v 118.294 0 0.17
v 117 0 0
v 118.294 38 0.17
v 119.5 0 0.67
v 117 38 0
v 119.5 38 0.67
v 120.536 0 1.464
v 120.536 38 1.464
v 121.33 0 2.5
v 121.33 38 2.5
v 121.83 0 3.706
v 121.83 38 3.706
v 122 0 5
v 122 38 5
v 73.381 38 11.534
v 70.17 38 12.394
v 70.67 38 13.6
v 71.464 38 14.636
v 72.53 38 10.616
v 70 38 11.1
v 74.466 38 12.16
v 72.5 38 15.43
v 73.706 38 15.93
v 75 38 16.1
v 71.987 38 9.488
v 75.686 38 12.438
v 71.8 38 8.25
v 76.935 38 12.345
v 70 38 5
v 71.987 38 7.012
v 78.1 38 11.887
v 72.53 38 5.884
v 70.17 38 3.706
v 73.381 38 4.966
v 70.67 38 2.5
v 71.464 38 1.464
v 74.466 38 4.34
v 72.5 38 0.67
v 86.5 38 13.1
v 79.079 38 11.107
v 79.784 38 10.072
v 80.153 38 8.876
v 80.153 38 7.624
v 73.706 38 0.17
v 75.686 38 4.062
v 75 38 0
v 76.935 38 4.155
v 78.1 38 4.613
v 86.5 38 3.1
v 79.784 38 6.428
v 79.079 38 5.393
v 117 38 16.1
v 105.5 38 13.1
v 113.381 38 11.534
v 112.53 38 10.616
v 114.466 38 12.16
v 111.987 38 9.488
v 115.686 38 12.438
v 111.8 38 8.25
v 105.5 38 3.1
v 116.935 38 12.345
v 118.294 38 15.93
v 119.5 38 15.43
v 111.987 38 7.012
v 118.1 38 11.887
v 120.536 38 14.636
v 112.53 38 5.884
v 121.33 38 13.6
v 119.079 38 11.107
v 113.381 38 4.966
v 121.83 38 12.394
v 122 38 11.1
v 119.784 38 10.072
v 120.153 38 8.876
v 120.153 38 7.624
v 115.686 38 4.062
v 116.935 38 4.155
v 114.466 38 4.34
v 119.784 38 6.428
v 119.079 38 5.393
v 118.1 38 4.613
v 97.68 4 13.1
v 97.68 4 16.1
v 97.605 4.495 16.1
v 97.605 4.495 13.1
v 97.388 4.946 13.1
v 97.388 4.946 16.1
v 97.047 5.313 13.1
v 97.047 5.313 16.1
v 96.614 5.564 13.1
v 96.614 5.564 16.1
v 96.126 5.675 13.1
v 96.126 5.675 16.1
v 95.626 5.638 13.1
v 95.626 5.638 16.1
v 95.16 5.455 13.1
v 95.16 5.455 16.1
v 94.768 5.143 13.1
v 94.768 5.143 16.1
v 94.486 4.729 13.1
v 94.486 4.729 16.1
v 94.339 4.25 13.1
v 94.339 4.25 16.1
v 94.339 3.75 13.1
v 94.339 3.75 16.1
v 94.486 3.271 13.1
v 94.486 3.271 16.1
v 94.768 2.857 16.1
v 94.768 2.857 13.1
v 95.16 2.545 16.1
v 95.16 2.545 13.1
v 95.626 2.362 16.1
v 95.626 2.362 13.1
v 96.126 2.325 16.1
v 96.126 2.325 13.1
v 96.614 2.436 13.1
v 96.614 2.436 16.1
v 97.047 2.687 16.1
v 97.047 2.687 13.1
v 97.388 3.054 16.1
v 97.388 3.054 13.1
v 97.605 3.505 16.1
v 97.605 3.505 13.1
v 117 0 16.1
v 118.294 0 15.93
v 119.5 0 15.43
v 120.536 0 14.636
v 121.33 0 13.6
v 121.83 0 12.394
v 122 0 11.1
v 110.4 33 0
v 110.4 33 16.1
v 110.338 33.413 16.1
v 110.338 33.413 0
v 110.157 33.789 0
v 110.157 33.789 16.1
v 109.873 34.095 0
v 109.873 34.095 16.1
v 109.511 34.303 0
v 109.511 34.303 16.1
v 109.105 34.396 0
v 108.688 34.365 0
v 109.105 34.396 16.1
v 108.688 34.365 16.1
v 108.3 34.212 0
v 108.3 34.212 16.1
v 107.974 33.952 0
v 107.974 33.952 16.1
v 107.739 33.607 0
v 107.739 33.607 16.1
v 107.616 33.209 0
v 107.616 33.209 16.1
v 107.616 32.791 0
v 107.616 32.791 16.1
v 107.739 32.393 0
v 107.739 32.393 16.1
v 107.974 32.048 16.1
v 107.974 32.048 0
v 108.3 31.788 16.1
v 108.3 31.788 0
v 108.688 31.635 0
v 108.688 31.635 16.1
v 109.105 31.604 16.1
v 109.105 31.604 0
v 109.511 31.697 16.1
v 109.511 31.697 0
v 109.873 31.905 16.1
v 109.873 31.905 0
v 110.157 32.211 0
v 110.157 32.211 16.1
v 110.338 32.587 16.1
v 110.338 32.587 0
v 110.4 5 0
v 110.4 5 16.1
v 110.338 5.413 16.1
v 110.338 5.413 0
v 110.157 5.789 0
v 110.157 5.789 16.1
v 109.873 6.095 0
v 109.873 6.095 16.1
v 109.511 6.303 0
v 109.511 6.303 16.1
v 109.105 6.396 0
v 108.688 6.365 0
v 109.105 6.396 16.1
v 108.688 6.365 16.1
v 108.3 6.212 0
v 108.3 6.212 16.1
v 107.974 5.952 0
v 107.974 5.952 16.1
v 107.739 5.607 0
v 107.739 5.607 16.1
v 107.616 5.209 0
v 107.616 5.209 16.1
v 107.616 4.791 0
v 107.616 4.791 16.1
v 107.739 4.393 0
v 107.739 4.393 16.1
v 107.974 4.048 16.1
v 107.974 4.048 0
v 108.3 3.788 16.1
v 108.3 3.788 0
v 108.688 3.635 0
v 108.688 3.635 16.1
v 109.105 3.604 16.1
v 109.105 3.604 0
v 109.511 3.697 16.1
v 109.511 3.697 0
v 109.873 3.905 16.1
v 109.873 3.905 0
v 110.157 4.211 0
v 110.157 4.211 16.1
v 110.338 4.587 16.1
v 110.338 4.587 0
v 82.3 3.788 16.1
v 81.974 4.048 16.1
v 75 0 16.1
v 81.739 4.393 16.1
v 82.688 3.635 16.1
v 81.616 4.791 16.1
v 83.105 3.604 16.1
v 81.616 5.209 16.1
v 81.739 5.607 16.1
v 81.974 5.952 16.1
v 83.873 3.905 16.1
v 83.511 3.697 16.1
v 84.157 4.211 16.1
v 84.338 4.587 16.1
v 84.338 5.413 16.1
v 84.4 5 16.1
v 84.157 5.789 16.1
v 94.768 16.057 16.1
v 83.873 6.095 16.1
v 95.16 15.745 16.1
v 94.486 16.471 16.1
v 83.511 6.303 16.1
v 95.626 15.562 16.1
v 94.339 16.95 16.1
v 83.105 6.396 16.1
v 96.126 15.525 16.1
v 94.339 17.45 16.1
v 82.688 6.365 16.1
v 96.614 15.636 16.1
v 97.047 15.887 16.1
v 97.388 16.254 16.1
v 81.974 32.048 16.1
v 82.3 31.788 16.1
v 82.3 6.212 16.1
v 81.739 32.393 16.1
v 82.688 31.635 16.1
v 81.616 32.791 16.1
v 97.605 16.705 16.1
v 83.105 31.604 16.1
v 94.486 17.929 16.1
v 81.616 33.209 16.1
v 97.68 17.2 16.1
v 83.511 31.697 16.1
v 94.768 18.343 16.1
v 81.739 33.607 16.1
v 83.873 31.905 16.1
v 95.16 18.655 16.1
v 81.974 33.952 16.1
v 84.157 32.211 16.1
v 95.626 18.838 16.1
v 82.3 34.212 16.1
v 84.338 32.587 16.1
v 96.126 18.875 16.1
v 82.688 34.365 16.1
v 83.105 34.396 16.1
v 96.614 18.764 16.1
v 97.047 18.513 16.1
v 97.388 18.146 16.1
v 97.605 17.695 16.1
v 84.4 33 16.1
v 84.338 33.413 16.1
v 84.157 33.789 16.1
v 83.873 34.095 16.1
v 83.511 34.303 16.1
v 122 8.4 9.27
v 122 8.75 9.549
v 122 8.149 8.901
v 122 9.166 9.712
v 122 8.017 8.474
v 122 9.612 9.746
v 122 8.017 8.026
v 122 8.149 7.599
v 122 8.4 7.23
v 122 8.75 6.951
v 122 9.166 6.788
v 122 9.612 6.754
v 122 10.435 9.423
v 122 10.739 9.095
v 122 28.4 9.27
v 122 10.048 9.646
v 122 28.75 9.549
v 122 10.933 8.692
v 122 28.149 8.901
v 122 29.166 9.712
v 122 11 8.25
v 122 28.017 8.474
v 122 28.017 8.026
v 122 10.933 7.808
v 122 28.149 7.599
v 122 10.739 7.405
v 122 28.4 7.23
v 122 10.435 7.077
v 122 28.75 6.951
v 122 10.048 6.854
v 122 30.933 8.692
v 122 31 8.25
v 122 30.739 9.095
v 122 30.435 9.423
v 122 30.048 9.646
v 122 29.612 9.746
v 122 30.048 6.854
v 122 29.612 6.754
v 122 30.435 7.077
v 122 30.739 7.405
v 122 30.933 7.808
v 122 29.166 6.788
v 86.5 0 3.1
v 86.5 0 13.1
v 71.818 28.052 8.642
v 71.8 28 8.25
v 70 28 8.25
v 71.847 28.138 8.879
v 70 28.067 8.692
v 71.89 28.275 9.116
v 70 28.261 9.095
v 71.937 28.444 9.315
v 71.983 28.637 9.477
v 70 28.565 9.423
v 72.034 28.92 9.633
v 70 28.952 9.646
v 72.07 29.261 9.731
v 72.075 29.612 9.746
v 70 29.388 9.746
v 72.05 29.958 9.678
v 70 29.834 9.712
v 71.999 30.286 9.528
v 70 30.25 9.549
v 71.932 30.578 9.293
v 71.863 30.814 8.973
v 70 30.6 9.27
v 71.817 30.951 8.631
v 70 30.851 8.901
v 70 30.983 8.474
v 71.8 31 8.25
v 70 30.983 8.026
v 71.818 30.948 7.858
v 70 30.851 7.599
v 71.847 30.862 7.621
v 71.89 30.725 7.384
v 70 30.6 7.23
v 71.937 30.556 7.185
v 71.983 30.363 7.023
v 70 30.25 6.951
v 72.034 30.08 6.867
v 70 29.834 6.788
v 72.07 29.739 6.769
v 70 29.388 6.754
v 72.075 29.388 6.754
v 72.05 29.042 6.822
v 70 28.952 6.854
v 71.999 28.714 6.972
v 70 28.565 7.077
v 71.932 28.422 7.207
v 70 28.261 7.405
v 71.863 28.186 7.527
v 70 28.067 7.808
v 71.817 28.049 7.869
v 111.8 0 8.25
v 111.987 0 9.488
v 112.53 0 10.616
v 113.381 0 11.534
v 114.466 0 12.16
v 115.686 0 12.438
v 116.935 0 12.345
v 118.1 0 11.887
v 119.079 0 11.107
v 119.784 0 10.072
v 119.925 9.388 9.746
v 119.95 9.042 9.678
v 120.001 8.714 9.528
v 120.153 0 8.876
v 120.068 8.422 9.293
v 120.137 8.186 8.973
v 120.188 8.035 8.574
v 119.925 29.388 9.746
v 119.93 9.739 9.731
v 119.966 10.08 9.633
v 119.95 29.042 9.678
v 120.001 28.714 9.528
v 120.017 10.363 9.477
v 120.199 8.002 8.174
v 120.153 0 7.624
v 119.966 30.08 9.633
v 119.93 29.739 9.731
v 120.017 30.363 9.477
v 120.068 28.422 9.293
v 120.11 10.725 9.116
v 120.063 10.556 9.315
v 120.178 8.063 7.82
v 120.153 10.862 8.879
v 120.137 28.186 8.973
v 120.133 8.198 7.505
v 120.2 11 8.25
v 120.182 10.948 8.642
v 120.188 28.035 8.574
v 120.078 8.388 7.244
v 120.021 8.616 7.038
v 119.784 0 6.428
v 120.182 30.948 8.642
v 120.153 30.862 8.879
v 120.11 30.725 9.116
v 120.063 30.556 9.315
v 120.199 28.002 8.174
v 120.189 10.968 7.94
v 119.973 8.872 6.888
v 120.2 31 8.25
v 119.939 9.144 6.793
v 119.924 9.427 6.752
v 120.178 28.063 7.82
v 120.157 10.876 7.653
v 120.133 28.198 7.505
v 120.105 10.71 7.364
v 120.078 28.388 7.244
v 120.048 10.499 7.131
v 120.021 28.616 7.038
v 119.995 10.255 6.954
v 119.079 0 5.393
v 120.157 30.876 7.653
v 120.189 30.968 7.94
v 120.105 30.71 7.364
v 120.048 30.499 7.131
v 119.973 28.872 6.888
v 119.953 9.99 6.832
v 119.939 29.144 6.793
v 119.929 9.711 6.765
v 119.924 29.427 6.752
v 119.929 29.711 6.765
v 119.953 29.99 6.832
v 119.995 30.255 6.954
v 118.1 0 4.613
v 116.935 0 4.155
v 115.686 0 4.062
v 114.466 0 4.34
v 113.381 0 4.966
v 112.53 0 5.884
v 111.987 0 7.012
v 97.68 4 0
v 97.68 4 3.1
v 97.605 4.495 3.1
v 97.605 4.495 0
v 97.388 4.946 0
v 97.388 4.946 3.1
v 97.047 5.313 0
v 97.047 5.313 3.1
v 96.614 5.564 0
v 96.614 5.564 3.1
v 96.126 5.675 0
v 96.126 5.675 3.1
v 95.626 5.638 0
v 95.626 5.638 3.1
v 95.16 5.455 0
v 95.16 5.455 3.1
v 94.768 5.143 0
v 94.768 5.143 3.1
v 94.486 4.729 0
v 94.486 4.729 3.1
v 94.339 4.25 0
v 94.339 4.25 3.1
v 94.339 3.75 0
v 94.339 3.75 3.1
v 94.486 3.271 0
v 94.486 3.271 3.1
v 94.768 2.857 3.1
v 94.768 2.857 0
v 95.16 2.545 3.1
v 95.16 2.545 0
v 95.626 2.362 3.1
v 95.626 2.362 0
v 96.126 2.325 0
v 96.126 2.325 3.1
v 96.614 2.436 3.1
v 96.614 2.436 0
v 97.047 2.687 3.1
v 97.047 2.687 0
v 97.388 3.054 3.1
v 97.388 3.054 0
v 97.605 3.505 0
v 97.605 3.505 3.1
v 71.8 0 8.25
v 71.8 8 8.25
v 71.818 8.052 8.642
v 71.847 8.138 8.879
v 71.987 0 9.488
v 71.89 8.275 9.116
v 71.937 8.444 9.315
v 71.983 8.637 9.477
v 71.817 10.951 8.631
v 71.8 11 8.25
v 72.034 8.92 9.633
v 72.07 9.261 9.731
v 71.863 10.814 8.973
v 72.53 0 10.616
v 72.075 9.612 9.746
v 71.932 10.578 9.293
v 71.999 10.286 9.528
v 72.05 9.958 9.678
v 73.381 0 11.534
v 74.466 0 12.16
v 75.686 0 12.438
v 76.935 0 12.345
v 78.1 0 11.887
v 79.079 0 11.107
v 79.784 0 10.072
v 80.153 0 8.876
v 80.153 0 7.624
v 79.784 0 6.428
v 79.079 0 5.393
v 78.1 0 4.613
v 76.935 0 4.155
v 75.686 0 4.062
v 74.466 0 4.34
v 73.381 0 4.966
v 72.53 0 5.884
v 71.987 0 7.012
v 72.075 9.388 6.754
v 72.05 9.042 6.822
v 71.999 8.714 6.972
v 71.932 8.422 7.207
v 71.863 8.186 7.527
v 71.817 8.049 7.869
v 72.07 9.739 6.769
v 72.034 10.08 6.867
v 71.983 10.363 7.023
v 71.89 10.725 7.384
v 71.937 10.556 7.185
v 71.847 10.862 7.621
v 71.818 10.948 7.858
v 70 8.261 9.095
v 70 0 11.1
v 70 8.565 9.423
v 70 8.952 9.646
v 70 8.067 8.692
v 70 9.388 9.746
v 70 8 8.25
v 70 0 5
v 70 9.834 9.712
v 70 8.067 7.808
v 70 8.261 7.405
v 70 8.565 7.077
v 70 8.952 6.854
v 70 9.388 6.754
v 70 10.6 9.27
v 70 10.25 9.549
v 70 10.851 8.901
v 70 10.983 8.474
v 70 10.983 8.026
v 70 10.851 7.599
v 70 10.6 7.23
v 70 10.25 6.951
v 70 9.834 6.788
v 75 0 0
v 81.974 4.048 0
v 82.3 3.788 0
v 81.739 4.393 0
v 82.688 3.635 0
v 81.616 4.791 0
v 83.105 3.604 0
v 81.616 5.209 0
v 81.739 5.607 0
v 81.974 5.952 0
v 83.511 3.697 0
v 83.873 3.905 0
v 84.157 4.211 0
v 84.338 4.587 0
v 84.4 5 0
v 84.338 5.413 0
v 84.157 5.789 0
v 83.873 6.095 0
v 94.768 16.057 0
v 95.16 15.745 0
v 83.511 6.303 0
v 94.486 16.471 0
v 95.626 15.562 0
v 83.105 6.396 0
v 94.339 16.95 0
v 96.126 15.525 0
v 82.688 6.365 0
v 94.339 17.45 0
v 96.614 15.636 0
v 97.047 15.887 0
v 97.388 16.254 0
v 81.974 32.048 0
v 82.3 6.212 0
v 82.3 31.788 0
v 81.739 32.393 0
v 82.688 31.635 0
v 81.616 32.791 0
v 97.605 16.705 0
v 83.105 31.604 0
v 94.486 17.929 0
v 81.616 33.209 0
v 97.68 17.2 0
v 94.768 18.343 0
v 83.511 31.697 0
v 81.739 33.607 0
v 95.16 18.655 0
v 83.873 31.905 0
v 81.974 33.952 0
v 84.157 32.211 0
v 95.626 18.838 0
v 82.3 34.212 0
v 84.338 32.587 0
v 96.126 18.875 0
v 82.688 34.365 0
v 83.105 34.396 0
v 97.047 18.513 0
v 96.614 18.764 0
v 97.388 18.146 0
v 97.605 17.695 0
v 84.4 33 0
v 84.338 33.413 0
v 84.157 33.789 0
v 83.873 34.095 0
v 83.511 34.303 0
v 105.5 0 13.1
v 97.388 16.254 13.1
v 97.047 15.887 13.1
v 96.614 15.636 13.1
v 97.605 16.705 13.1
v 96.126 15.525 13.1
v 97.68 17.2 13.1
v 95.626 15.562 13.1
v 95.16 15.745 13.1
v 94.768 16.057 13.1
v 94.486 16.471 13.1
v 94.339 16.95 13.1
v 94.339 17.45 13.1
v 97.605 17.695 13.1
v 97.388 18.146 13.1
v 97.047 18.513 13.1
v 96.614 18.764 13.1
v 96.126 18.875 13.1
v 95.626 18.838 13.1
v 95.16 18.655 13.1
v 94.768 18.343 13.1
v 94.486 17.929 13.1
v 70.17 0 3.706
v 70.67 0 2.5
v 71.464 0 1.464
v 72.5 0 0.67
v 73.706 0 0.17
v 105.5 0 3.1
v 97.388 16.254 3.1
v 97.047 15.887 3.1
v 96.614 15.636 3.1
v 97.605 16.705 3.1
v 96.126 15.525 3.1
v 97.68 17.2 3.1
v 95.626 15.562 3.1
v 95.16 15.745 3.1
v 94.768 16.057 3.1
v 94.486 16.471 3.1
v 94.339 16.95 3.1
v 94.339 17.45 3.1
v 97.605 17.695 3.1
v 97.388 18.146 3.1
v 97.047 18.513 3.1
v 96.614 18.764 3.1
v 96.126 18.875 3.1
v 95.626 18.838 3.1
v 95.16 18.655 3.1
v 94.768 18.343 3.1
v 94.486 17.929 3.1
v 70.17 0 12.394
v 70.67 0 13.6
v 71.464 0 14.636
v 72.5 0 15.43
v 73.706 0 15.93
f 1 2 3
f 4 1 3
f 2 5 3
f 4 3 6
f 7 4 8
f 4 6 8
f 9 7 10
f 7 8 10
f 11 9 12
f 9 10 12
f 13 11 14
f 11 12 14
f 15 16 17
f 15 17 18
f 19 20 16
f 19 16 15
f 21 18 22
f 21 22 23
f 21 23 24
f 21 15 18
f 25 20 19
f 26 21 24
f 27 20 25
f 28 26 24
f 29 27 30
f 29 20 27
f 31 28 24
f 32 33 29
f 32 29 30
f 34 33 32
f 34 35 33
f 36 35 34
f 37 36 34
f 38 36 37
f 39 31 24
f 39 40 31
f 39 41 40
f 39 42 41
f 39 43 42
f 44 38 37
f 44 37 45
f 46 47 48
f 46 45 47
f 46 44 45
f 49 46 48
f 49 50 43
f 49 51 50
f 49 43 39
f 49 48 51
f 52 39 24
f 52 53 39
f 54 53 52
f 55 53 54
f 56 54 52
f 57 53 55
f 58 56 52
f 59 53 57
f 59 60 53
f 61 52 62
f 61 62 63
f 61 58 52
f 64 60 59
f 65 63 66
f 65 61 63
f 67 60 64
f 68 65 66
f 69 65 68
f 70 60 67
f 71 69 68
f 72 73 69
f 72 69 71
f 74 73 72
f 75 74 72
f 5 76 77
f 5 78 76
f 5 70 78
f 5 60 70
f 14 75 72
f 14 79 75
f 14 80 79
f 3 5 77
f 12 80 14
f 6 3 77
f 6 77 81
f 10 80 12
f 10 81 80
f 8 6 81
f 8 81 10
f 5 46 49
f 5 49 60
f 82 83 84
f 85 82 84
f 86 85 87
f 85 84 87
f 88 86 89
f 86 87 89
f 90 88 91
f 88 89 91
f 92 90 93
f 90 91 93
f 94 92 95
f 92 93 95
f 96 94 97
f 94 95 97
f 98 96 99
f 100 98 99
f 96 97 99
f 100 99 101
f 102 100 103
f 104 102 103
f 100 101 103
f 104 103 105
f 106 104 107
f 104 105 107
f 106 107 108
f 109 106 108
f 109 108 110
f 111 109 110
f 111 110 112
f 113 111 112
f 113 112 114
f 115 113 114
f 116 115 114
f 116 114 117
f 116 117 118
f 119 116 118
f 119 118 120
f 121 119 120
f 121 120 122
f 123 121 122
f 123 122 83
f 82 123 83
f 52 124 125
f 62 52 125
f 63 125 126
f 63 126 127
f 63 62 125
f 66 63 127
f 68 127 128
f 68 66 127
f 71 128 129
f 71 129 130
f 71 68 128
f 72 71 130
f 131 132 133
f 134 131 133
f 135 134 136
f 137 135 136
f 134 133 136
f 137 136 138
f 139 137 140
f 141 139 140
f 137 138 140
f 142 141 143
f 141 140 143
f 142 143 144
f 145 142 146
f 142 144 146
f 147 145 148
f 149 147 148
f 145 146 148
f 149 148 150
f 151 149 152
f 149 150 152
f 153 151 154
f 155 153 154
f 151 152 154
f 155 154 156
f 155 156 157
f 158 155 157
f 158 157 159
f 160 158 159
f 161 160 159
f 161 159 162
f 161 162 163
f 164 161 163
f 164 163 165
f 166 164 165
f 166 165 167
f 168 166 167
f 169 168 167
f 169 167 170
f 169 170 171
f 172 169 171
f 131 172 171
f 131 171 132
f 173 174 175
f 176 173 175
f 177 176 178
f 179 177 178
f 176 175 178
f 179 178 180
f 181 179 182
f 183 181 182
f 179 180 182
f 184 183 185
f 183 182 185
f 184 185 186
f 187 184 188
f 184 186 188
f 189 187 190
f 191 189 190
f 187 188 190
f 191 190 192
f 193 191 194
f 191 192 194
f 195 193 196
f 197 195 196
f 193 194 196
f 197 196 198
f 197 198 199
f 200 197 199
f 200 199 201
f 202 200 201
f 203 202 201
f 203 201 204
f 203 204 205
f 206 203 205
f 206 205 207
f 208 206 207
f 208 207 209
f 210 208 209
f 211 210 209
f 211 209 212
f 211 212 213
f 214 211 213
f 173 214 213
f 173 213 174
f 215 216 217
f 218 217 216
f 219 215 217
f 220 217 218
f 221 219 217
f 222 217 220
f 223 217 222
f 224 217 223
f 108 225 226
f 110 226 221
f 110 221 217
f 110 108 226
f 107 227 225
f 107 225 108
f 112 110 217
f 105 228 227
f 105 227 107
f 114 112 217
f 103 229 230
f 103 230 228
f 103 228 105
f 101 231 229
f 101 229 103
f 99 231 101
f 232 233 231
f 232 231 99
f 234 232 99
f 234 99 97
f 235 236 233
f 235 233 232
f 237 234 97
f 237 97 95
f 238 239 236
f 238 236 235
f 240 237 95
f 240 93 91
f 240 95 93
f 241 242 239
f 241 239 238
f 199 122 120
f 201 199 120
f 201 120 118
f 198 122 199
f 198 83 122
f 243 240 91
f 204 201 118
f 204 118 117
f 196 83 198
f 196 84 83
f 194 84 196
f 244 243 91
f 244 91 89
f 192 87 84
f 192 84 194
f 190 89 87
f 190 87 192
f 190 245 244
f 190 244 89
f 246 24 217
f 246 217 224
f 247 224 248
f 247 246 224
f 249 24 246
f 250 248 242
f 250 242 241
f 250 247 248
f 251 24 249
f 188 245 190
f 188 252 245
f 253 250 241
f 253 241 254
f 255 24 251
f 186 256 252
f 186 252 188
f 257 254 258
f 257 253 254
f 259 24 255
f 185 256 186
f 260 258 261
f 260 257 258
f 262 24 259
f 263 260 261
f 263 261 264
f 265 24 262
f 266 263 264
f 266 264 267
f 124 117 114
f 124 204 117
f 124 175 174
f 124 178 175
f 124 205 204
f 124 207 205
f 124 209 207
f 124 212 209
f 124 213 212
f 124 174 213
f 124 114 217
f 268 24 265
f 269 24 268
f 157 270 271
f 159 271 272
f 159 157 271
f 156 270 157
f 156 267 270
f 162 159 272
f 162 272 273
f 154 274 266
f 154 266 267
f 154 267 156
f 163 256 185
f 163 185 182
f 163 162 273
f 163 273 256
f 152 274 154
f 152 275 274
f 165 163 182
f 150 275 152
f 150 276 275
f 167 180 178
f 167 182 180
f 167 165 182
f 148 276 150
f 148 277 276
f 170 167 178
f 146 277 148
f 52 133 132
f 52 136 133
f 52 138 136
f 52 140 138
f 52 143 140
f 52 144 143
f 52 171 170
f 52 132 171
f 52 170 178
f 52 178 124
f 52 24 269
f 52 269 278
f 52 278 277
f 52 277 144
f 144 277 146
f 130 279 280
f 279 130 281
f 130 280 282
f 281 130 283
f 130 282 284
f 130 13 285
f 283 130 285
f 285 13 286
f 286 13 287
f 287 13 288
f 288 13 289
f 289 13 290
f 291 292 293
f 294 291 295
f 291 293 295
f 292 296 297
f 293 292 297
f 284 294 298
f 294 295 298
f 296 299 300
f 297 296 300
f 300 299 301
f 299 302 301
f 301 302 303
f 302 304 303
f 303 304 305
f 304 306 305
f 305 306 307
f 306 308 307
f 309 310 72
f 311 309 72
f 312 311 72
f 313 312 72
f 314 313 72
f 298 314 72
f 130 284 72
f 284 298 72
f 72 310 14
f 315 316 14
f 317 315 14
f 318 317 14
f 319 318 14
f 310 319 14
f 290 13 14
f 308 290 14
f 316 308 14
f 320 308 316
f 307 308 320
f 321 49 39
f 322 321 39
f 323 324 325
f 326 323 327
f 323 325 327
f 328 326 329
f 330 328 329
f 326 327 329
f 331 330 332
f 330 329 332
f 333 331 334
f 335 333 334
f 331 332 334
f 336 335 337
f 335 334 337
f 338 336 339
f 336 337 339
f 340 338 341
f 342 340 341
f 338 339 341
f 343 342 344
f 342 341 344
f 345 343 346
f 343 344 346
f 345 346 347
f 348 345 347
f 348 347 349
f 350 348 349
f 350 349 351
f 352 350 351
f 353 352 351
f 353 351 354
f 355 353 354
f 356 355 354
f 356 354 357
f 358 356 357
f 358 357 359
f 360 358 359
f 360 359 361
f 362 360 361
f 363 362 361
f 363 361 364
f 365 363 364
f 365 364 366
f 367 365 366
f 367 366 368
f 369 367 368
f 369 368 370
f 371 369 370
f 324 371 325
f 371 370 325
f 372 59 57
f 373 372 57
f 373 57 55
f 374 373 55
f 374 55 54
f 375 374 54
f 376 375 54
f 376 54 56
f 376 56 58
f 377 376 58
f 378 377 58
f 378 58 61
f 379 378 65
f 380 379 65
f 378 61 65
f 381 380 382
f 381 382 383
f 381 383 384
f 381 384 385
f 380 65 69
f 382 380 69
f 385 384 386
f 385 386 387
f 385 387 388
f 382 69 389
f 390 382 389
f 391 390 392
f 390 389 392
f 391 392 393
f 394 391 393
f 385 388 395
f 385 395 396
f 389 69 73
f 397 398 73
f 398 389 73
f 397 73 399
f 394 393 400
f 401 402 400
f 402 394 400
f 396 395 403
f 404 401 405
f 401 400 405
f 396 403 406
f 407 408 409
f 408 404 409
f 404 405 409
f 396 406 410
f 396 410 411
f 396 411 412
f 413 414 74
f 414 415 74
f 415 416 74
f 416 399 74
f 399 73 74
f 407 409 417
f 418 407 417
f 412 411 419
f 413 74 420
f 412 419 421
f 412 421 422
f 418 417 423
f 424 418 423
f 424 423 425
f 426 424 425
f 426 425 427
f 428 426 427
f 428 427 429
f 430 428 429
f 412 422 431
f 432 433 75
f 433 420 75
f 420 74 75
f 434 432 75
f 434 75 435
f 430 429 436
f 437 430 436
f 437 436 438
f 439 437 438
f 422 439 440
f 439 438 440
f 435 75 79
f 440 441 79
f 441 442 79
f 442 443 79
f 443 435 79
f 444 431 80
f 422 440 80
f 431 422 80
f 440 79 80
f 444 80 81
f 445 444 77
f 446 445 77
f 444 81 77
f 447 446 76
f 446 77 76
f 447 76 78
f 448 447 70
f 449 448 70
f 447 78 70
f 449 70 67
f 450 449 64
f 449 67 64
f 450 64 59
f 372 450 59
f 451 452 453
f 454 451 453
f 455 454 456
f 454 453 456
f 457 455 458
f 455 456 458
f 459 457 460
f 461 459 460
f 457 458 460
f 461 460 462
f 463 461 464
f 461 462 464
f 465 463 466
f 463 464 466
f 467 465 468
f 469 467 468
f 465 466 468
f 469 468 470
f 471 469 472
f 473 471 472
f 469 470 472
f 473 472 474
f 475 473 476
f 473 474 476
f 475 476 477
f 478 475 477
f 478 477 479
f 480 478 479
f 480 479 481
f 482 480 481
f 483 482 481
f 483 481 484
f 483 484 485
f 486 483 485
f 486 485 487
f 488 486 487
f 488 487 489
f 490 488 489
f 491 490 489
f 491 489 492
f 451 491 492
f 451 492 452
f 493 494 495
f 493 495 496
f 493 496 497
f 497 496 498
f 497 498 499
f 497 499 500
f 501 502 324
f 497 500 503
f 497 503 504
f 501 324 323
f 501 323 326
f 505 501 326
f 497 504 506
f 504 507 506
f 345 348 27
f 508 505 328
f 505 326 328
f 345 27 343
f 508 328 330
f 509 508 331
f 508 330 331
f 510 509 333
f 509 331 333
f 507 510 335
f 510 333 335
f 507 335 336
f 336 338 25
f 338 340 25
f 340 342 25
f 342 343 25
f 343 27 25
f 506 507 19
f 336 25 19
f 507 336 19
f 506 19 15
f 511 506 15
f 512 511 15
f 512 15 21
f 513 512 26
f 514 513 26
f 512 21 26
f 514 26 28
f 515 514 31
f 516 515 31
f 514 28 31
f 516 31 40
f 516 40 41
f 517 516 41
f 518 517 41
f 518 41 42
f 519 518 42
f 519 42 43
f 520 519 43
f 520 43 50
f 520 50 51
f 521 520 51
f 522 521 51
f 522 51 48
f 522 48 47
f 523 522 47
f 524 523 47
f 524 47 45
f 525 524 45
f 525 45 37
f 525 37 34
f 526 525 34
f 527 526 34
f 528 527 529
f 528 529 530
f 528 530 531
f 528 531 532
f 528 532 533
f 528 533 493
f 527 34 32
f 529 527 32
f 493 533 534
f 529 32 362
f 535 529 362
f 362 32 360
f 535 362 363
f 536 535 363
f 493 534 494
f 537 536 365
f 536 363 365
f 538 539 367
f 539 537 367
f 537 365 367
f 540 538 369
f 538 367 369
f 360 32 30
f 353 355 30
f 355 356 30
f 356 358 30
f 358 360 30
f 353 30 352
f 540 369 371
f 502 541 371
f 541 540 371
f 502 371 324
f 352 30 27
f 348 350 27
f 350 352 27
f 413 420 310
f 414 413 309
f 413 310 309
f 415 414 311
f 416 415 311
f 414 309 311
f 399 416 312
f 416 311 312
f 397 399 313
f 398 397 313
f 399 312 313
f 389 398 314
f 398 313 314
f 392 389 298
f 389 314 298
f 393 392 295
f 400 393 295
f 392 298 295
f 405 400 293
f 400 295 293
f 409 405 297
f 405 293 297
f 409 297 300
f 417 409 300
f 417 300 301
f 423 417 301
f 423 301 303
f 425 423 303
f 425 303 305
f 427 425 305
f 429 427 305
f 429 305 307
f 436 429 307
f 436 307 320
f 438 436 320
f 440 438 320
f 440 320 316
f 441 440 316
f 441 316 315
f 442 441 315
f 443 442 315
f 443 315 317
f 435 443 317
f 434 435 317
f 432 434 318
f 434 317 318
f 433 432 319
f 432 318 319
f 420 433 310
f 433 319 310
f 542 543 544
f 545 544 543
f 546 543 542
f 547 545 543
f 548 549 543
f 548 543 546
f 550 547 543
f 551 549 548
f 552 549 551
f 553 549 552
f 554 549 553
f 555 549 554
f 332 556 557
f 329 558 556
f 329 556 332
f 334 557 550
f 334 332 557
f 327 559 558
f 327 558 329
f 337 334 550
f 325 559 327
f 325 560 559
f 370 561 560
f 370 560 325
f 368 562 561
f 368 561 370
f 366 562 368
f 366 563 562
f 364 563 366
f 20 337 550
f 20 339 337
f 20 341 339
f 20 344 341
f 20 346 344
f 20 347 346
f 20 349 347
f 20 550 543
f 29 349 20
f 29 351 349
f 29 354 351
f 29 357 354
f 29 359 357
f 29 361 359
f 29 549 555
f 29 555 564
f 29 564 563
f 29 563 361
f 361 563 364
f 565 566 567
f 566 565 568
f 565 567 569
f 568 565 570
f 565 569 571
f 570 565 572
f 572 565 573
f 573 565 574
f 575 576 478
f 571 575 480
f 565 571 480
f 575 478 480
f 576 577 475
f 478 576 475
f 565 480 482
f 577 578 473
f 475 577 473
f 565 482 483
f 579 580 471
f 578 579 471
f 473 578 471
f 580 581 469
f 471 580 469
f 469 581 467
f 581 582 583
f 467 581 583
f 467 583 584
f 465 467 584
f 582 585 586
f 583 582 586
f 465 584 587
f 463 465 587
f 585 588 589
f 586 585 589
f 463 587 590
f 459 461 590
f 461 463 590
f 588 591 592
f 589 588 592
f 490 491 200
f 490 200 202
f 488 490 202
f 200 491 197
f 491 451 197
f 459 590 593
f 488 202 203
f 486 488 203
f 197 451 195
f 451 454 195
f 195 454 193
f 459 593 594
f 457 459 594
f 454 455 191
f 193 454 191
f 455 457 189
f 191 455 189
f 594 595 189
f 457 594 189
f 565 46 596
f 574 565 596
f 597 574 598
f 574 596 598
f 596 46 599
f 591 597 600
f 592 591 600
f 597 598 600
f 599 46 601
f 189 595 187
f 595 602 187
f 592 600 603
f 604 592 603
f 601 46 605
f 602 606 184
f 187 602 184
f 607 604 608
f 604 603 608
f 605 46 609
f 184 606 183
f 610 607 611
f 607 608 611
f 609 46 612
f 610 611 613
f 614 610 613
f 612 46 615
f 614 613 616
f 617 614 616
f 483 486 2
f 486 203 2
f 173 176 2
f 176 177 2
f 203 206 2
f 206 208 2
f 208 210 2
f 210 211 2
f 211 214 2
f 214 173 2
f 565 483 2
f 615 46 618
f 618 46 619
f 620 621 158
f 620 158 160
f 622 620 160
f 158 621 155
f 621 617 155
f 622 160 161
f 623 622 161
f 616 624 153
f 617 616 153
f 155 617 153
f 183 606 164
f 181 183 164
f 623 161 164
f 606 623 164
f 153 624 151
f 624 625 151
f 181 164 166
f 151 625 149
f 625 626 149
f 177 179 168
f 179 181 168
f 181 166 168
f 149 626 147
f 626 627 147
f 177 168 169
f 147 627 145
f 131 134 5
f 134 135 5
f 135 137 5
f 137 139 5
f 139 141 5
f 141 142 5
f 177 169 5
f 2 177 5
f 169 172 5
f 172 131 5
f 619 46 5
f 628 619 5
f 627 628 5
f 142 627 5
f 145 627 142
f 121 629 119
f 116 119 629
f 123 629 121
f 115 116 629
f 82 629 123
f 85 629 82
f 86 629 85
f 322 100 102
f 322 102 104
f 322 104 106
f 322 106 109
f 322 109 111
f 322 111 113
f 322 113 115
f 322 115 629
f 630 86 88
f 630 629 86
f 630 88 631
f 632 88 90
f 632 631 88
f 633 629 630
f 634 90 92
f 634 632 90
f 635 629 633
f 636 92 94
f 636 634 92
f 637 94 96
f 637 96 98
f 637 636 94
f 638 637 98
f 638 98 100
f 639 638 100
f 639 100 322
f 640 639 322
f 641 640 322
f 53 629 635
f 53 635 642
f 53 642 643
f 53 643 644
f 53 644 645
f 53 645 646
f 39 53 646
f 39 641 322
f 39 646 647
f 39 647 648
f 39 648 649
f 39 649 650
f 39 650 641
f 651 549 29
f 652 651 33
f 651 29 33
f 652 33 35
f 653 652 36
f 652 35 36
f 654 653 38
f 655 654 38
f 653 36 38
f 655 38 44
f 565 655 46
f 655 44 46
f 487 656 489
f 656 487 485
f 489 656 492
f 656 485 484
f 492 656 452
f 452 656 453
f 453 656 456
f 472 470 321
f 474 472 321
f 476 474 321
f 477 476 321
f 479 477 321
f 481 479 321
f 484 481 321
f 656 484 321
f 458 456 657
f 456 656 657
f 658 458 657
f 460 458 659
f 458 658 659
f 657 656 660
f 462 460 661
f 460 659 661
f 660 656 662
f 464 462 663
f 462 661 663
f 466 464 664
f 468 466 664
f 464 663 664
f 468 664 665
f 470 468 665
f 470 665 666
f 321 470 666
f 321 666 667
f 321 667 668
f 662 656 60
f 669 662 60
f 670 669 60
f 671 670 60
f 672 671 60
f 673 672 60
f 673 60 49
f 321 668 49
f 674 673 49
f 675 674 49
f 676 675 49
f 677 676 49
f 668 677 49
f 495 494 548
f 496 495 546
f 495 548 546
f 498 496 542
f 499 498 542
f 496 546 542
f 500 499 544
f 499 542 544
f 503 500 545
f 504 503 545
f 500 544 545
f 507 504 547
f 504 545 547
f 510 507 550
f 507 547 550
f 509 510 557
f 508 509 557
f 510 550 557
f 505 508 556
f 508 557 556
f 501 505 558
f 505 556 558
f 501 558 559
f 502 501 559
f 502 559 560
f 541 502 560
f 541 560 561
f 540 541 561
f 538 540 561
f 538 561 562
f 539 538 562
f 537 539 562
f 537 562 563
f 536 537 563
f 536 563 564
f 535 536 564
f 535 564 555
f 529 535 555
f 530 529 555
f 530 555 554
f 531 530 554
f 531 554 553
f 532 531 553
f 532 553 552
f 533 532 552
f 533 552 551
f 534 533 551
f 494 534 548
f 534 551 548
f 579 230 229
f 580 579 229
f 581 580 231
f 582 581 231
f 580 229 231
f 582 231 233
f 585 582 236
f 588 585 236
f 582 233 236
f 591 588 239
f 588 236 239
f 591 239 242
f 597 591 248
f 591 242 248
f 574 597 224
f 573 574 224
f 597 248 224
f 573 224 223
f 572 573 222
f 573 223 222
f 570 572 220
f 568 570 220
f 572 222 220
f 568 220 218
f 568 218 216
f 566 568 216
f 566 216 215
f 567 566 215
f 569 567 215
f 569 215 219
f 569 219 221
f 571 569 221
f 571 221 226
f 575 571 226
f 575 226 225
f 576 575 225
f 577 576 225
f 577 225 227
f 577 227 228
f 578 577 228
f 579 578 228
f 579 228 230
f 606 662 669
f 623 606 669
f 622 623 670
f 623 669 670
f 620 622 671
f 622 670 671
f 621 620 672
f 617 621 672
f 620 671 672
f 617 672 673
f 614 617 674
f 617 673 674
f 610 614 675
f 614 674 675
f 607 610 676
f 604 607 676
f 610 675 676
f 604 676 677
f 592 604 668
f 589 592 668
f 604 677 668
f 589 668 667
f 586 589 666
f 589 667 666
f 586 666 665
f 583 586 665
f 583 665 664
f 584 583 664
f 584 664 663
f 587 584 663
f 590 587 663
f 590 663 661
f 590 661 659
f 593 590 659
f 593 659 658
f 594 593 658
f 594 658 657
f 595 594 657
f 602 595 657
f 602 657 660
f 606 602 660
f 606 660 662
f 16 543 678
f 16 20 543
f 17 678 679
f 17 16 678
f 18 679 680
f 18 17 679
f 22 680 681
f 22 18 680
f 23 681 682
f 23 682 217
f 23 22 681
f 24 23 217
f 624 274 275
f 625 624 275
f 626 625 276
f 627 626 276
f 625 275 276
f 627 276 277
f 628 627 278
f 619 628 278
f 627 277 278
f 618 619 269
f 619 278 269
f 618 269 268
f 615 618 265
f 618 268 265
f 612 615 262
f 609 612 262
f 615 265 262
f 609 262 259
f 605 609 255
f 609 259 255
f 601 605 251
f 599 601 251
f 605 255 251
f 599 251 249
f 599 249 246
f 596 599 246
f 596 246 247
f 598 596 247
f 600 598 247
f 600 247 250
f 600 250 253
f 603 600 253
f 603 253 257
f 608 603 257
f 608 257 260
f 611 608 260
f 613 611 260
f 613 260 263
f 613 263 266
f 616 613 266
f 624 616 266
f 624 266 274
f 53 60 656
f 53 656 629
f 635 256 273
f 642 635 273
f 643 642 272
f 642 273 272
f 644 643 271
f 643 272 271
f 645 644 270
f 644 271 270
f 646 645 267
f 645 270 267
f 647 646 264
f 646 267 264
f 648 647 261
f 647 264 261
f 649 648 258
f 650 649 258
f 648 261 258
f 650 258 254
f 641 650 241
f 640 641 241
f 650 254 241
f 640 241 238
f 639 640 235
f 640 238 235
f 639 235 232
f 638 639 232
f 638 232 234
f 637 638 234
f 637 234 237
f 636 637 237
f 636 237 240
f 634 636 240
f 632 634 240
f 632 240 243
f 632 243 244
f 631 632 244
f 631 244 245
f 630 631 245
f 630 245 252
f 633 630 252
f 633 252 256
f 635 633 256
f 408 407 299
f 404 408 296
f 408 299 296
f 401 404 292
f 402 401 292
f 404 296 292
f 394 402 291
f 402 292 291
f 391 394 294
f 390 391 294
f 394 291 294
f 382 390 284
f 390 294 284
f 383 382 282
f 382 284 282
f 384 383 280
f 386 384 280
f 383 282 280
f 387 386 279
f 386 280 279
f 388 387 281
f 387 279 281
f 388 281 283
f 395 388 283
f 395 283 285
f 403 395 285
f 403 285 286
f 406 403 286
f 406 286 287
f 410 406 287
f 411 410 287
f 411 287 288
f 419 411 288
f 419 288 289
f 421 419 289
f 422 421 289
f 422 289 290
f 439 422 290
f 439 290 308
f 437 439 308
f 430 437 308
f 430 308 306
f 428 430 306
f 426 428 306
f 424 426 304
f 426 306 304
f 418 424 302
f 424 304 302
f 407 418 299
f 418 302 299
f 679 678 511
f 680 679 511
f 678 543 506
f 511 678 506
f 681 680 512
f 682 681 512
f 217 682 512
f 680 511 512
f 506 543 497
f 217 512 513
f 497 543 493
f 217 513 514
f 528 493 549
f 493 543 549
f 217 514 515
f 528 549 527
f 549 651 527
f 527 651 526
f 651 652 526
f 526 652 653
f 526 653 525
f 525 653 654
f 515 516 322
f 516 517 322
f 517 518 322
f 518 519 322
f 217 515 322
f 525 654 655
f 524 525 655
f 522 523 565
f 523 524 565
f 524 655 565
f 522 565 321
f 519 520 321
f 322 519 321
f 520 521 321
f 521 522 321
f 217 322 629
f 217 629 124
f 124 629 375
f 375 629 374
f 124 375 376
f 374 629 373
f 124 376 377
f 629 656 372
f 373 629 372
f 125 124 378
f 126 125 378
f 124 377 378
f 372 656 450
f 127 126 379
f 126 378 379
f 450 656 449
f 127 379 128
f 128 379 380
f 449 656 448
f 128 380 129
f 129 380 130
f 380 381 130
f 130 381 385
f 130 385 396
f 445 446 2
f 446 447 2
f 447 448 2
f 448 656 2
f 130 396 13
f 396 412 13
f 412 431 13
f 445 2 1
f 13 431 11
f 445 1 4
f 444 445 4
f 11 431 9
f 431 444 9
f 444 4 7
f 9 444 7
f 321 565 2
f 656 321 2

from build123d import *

# Parameters (mm, degrees)
BOX003_W        = 52
BOX003_H        = 38
BOX003_DEPTH    = 16.1
SKETCH018_R     = 4.2
SKETCH018_W     = 19
SKETCH018_H     = 10
POCKET010_DEPTH = 38.001
SKETCH020_R     = 1.4
SKETCH020_R_2   = 1.68
POCKET011_DEPTH = 16.101
SKETCH021_R     = 1.5
POCKET012_DEPTH = 3
SKETCH019_R     = 1.5
POCKET013_DEPTH = 3
FILLET006_R     = 5


with BuildPart() as part:
    # Box003 → Box003 (new body)
    with BuildSketch(Plane(origin=(70, 0, 0), x_dir=(1, 0, 0), z_dir=(0, 0, 1))):
        with Locations((26, 19)):
            Rectangle(BOX003_W, BOX003_H)
    extrude(amount=BOX003_DEPTH)

    # Sketch018 → Pocket010 (cut, through all)
    with BuildSketch(Plane(origin=(70, 38, 0), x_dir=(-1, 0, 0), z_dir=(0, 1, 0))):
        with Locations((-46, 8.25)):
            Circle(SKETCH018_R)
        with Locations((-6, 8.25)):
            Circle(SKETCH018_R)
        with Locations((-26, 8.1)):
            Rectangle(SKETCH018_W, SKETCH018_H)
    extrude(amount=-POCKET010_DEPTH, mode=Mode.SUBTRACT)

    # Sketch020 → Pocket011 (cut, through all)
    with BuildSketch(Plane(origin=(70, 0, 16.1), x_dir=(1, 0, 0), z_dir=(0, 0, 1))):
        with Locations((13, 5)):
            Circle(SKETCH020_R)
        with Locations((39, 5)):
            Circle(SKETCH020_R)
        with Locations((39, 33)):
            Circle(SKETCH020_R)
        with Locations((13, 33)):
            Circle(SKETCH020_R)
        with Locations((26, 4)):
            Circle(SKETCH020_R_2)
        with Locations((26, 17.2)):
            Circle(SKETCH020_R_2)
    extrude(amount=-POCKET011_DEPTH, mode=Mode.SUBTRACT)

    # Sketch021 → Pocket012 (cut)
    with BuildSketch(Plane(origin=(70, 0, 0), x_dir=(0, -1, 0), z_dir=(-1, 0, 0))):
        with Locations((-29.5, 8.25)):
            Circle(SKETCH021_R)
        with Locations((-9.5, 8.25)):
            Circle(SKETCH021_R)
    extrude(amount=-POCKET012_DEPTH, mode=Mode.SUBTRACT)

    # Sketch019 → Pocket013 (cut)
    with BuildSketch(Plane.YZ.offset(122)):
        with Locations((9.5, 8.25)):
            Circle(SKETCH019_R)
        with Locations((29.5, 8.25)):
            Circle(SKETCH019_R)
    extrude(amount=-POCKET013_DEPTH, mode=Mode.SUBTRACT)

    # Fillet006
    fillet006_edges = [part.edges().sort_by_distance(p)[0] for p in [
        (122, 19, 16.1),
        (122, 19, 0),
        (70, 19, 0),
        (70, 19, 16.1),
    ]]
    fillet(fillet006_edges, radius=FILLET006_R)


solid = part.part
